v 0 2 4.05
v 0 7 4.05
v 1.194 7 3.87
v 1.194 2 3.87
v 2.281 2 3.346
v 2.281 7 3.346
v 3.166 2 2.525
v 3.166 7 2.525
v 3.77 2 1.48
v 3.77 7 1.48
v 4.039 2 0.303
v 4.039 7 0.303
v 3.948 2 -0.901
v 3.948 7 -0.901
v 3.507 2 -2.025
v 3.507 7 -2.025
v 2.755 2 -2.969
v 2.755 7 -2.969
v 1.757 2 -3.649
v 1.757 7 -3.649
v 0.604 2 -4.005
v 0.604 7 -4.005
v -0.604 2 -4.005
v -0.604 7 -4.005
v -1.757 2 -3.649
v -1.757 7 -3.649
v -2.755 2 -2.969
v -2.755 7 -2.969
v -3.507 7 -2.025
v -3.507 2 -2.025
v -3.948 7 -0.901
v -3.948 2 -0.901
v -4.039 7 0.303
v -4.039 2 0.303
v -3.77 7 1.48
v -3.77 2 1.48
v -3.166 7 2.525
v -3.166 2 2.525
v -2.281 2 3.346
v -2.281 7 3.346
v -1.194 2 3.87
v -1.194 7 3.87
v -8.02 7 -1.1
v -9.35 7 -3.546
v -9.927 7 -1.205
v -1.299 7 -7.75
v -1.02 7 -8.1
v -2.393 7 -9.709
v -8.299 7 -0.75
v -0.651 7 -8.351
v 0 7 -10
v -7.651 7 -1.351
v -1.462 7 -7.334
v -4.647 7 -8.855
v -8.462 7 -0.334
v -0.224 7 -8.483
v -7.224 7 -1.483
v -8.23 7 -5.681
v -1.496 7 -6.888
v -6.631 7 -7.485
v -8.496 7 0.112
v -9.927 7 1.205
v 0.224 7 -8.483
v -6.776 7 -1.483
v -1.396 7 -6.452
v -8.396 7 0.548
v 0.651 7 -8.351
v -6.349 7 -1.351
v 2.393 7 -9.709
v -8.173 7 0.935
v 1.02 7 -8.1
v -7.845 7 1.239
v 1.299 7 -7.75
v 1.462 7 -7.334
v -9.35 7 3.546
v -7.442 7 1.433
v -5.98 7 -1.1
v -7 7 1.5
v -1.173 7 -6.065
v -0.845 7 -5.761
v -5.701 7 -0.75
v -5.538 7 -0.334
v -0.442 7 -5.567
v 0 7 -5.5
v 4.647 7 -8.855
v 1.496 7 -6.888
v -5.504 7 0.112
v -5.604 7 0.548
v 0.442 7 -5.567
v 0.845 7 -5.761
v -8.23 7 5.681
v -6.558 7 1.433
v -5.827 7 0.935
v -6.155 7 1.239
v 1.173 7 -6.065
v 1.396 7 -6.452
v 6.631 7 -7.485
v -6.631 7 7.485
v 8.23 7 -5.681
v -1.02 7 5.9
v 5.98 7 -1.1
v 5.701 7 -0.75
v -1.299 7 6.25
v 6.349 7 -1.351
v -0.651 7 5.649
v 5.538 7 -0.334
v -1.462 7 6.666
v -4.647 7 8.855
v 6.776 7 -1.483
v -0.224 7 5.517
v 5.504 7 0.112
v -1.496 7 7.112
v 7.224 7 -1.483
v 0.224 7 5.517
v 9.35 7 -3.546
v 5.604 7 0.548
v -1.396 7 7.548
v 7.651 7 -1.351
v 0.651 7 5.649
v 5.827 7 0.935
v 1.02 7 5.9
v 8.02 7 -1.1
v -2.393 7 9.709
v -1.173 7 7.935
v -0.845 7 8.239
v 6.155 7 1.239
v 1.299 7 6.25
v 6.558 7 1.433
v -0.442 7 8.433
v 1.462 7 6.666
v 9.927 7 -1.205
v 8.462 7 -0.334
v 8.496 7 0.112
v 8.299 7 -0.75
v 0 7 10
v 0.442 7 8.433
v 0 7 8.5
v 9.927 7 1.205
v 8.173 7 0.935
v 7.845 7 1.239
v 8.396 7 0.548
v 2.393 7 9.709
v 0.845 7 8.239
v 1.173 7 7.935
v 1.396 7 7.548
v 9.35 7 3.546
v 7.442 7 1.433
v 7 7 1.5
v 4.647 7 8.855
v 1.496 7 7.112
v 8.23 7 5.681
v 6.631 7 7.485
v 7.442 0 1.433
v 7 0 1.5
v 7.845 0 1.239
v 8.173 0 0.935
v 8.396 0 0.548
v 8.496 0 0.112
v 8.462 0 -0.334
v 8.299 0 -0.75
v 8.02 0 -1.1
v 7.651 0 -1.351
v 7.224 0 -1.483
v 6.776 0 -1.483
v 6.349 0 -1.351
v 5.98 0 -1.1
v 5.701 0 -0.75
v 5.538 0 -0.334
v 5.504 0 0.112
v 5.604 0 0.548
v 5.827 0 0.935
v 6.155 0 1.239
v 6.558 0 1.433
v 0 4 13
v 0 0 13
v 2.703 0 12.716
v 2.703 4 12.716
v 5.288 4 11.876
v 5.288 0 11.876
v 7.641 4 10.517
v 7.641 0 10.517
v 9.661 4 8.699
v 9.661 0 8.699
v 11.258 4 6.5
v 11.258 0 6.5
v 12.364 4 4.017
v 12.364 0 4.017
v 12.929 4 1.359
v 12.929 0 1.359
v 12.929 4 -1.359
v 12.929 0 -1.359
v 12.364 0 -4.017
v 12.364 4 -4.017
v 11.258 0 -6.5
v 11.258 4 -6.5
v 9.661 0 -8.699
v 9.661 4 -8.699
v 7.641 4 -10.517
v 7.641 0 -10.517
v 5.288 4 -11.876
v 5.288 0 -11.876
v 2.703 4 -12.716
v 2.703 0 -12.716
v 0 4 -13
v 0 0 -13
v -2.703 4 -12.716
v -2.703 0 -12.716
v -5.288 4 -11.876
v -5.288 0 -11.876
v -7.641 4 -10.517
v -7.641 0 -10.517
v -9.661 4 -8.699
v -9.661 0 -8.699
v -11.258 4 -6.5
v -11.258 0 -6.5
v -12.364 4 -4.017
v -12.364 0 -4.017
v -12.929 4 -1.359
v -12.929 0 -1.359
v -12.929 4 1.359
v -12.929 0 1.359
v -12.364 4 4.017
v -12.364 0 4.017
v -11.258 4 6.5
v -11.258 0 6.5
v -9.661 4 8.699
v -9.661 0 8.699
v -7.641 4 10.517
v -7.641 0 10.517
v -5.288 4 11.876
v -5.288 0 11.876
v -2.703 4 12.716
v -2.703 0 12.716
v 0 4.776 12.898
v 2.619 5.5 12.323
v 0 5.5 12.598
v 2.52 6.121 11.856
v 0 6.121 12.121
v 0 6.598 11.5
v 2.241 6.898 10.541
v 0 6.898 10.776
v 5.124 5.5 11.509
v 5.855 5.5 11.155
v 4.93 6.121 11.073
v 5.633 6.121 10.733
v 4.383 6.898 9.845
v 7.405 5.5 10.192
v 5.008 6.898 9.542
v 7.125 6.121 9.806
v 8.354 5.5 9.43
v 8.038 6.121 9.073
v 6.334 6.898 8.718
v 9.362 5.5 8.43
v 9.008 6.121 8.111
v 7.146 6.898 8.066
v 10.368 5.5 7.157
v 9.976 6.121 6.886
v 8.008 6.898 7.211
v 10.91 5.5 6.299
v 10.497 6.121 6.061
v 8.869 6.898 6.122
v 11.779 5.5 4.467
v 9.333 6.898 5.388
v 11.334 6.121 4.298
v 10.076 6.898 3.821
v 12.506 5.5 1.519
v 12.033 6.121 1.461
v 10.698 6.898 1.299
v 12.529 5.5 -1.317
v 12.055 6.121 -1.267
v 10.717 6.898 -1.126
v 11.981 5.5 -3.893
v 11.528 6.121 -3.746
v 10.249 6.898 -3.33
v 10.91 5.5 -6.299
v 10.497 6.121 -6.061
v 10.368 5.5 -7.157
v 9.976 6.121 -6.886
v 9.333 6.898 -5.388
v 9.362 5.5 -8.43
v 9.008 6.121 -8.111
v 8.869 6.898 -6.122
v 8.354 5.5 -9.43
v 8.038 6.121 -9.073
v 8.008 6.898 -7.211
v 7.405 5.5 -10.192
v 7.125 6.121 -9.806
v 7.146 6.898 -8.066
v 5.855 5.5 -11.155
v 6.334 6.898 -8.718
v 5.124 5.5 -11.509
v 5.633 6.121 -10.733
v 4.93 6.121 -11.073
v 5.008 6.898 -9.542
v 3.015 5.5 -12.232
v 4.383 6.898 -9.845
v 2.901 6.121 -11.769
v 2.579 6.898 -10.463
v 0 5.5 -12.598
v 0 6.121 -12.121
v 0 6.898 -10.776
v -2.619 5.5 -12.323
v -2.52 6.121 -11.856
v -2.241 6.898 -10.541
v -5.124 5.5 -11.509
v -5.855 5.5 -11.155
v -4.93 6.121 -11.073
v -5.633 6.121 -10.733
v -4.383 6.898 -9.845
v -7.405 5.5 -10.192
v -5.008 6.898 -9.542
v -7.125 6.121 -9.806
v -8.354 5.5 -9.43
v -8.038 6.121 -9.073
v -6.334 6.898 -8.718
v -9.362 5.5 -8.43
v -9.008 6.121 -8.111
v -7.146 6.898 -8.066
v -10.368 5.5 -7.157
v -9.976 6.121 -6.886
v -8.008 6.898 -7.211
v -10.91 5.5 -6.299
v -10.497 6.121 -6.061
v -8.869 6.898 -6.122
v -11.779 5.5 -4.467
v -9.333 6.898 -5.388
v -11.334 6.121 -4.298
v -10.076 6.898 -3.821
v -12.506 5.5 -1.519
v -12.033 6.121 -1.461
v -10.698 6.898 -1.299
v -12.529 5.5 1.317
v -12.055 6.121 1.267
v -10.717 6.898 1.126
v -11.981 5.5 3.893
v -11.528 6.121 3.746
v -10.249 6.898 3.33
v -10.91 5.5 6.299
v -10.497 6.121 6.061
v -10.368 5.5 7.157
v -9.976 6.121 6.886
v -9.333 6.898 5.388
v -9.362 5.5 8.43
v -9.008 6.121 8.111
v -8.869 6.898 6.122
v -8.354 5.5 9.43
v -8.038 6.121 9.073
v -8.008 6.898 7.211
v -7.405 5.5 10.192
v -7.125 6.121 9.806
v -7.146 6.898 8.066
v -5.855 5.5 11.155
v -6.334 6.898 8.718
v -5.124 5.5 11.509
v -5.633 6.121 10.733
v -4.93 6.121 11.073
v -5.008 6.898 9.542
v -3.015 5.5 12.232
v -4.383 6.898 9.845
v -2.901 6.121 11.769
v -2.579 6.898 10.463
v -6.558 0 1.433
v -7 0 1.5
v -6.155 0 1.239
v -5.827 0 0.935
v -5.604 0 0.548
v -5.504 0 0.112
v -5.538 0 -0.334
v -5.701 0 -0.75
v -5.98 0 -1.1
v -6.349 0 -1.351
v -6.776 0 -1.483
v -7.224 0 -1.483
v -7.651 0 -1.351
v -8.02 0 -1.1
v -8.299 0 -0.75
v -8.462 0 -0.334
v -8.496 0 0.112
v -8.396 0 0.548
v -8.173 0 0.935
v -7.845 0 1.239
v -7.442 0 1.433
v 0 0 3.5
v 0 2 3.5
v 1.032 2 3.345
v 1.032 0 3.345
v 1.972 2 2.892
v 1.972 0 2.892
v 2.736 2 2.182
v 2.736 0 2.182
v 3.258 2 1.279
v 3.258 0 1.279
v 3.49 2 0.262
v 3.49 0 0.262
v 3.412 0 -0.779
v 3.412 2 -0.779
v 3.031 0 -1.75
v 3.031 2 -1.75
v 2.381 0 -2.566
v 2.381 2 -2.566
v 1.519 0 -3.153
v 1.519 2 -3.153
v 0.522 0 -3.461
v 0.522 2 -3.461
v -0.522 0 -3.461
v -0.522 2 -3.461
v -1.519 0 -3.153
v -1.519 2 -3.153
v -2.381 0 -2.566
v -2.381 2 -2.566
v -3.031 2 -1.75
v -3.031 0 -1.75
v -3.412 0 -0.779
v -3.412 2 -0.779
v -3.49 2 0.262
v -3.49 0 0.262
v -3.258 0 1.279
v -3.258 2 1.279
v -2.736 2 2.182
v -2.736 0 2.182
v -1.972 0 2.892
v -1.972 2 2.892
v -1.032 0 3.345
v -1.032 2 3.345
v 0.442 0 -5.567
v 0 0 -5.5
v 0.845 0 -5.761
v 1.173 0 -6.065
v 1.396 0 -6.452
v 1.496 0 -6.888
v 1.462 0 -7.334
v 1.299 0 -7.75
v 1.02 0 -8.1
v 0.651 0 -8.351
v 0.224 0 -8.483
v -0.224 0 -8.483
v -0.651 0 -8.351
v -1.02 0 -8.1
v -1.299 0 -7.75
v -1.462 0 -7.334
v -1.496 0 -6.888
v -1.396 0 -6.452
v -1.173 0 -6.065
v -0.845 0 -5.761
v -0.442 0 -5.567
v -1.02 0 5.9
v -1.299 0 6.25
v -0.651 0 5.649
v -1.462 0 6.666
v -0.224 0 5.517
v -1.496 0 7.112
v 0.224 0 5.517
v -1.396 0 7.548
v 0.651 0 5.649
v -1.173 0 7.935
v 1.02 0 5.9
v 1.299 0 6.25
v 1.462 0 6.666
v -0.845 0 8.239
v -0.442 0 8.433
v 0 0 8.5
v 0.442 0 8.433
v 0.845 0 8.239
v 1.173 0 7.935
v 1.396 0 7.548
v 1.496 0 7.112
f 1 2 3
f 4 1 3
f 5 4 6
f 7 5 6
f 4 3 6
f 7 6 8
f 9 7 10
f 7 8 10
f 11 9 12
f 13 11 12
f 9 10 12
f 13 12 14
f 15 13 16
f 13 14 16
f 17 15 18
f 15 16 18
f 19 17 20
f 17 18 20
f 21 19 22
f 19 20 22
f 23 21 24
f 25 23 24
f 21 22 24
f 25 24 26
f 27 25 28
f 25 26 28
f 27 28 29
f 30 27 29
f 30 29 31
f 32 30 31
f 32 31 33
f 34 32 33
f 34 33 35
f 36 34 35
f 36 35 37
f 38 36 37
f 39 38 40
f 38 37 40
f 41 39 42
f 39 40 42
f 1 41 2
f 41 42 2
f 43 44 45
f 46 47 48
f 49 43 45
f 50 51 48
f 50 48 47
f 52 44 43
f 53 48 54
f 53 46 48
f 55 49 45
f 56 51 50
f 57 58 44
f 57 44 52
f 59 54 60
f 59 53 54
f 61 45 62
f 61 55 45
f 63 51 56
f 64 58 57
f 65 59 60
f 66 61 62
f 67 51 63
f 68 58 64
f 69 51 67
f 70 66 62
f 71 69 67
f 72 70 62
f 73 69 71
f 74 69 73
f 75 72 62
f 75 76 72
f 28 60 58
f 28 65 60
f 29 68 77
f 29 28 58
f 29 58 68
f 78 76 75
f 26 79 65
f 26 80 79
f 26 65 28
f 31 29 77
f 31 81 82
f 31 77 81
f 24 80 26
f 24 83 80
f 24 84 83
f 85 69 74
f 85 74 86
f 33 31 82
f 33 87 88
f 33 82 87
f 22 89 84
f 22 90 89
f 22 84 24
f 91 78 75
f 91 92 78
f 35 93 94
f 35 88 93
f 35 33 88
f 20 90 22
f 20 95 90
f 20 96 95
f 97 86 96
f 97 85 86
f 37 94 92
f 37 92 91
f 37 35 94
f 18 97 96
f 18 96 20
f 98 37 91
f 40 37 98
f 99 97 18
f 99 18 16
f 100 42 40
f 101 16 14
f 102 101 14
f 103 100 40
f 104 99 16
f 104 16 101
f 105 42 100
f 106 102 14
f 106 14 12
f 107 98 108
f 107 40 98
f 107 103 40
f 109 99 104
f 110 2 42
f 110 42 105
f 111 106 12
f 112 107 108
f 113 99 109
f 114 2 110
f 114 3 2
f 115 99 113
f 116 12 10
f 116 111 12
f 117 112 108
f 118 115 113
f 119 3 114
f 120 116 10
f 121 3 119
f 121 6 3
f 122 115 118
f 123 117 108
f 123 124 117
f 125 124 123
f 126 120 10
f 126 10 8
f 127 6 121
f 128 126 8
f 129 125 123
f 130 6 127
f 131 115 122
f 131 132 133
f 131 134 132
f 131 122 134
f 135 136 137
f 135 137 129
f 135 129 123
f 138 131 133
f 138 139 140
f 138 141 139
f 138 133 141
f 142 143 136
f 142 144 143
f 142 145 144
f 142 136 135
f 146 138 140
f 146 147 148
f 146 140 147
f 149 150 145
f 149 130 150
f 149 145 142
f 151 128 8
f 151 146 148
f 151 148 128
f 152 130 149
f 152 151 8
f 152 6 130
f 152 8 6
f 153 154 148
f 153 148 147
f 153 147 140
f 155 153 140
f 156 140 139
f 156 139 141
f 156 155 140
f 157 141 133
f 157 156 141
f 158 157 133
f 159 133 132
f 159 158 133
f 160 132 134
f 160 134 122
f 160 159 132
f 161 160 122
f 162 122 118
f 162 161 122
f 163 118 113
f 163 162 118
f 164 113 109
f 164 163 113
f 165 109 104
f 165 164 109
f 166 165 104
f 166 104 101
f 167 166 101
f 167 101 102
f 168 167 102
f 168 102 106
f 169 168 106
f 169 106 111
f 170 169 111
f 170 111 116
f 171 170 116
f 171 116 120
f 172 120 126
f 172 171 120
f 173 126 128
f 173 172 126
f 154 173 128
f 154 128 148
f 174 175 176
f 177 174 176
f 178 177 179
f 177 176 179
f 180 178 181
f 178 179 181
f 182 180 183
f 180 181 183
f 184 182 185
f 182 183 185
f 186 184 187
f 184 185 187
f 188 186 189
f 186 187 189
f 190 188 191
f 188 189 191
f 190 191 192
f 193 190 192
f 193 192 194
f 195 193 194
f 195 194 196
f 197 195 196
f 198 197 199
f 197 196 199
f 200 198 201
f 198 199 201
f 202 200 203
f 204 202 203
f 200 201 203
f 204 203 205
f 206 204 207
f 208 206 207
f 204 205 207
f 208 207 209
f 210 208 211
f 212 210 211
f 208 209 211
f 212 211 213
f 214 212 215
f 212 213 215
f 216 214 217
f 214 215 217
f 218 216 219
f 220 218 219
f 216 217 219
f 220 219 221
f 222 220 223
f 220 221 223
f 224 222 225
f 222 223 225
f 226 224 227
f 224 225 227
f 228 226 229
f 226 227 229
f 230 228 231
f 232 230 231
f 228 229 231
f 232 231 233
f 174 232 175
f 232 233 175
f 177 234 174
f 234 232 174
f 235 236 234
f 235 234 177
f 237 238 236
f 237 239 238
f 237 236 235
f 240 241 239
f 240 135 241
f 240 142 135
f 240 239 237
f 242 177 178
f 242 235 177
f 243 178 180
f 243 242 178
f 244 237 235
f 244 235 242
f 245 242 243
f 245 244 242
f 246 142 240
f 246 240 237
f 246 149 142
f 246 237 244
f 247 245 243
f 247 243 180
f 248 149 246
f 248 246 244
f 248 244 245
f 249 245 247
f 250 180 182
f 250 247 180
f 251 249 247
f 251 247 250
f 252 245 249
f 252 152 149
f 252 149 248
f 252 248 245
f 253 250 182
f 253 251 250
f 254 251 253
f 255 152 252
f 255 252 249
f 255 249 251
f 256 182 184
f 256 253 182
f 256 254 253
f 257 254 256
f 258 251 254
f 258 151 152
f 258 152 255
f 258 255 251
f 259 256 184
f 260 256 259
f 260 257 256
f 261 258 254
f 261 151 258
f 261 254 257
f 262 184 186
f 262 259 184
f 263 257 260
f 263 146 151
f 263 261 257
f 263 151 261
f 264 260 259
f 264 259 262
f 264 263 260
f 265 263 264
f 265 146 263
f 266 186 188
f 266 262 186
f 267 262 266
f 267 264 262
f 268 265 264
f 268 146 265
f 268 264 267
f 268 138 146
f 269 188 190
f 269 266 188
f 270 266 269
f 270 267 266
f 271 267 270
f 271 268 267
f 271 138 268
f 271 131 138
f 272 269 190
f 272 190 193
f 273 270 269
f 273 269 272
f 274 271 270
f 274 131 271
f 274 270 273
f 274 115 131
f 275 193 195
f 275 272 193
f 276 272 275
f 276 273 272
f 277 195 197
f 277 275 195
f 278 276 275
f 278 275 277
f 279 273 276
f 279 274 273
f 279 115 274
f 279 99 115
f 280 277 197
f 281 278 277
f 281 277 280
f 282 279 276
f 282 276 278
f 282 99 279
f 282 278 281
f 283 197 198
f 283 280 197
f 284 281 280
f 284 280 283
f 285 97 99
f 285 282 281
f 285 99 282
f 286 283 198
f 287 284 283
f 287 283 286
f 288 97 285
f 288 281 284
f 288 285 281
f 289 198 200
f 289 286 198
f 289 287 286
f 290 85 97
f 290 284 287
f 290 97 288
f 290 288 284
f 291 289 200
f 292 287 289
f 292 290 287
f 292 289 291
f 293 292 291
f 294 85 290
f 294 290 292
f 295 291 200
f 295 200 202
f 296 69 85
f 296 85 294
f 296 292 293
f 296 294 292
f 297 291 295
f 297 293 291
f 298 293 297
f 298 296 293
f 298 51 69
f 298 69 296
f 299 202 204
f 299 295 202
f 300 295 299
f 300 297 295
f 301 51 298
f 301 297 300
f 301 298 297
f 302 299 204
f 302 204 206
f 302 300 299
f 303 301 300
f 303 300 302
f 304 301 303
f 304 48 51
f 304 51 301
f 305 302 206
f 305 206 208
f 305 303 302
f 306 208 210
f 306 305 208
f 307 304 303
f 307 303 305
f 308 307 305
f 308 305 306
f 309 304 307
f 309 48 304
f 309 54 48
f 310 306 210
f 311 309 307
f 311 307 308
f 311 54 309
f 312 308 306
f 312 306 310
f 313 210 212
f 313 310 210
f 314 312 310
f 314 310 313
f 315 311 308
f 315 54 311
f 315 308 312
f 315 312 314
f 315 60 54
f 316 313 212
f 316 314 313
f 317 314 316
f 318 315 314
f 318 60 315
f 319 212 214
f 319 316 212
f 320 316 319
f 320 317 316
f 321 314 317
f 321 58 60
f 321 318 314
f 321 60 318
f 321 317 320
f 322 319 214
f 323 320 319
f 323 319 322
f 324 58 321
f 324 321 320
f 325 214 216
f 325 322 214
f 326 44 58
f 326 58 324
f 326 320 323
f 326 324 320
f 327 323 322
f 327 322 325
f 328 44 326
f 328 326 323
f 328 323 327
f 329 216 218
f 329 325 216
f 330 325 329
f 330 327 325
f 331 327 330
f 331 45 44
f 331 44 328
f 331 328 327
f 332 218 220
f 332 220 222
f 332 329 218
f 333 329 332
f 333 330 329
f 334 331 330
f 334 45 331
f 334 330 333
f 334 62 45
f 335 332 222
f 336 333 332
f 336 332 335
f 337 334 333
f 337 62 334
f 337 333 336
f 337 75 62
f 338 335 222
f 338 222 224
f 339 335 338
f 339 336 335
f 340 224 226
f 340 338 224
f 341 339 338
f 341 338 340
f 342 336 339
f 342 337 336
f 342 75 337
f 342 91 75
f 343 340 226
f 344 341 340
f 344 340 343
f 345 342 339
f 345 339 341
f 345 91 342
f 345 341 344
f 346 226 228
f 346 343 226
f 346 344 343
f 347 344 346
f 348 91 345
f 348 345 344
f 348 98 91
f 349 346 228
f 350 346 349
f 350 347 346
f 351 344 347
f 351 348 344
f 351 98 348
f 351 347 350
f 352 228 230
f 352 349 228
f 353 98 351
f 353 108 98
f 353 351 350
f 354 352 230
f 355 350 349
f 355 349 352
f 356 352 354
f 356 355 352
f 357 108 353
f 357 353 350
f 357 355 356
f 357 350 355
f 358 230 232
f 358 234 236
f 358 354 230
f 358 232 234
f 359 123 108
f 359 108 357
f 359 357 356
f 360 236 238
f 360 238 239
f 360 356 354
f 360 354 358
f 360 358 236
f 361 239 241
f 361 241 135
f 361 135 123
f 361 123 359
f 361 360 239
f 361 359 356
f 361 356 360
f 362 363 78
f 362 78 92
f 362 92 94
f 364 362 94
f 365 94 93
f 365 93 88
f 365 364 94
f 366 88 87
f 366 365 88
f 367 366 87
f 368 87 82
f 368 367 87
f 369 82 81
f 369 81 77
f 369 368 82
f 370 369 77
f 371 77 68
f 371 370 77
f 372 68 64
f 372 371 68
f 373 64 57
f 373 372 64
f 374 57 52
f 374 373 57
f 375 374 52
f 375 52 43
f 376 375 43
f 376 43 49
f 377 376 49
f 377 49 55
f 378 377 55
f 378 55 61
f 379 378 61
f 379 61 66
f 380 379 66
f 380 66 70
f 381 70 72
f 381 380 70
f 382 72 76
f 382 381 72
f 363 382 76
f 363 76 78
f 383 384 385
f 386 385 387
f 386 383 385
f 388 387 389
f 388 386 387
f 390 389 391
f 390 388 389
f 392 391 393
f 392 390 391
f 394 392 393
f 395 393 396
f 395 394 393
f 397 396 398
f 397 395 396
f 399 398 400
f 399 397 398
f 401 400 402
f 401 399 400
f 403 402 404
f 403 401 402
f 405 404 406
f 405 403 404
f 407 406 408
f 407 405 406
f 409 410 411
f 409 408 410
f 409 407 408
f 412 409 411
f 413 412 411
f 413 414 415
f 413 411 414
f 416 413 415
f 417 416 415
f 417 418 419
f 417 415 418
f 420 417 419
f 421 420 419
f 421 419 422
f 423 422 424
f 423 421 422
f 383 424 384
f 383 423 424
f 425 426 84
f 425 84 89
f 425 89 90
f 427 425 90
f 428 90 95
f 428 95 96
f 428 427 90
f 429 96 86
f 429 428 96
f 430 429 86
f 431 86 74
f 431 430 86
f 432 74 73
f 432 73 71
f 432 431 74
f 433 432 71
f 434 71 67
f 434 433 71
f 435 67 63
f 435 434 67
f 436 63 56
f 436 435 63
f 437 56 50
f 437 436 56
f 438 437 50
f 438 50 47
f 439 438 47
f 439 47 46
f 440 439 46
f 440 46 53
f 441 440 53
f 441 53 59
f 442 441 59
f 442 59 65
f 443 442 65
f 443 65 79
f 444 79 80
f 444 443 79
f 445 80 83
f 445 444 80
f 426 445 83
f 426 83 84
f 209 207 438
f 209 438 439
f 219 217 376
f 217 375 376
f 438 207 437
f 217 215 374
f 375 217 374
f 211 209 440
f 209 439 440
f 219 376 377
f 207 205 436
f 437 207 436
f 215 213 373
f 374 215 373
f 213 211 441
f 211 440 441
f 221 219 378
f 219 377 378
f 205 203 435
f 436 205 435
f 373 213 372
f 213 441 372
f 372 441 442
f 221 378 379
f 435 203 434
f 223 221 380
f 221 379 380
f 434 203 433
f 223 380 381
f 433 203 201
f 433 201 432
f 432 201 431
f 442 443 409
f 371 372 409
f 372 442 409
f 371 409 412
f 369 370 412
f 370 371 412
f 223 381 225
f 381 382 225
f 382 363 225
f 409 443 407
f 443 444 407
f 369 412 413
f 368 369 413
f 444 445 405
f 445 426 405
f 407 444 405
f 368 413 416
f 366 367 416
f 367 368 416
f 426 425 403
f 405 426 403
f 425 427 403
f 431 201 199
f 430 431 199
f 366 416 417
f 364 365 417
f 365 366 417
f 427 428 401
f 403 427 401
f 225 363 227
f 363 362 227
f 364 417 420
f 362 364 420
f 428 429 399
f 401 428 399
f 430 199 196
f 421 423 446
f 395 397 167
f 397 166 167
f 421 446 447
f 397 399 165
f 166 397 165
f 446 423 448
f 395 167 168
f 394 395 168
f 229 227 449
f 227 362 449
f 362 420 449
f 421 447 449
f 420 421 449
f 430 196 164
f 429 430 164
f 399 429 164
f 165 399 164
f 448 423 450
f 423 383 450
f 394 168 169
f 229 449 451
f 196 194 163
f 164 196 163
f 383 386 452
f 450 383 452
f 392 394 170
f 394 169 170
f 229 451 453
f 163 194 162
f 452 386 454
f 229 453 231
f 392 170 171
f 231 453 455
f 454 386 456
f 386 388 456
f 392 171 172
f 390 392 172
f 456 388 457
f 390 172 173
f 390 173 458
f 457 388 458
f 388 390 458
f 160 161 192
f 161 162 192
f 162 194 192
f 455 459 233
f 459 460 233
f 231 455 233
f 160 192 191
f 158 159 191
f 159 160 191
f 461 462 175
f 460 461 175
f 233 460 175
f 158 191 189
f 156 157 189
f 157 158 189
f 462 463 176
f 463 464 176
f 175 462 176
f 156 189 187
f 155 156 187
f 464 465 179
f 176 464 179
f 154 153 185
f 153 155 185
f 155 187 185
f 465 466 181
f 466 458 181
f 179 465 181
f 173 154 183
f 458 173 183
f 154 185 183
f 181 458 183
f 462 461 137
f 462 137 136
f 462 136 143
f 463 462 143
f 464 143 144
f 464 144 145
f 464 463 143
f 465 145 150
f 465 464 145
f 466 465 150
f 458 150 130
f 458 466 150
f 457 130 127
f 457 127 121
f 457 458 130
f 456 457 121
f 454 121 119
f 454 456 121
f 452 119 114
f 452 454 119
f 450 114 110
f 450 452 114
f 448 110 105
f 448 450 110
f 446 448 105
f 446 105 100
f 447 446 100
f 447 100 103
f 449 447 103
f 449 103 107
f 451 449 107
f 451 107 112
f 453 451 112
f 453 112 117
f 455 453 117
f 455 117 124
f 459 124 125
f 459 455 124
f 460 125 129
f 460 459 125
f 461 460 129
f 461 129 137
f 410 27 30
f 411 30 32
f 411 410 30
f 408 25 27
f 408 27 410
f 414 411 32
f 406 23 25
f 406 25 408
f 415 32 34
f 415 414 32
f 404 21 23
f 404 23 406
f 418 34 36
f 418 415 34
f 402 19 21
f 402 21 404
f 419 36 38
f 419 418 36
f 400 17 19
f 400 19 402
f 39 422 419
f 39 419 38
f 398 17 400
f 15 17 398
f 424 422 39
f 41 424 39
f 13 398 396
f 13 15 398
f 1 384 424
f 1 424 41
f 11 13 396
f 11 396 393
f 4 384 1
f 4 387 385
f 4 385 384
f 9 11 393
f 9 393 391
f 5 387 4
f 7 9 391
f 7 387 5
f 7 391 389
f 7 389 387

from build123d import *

# Parameters (mm, degrees)
SKETCH1_R           = 13
SKETCH1_R_2         = 3.5
SKETCH1_R_3         = 1.5
BOSS_EXTRUDE1_DEPTH = 7
SKETCH2_R           = 4.05
CUT_EXTRUDE1_DEPTH  = 5
FILLET1_R           = 3


with BuildPart() as part:
    # Sketch1 → Boss-Extrude1 (new body)
    with BuildSketch(Plane(origin=(0, 0, 0), x_dir=(1, 0, 0), z_dir=(0, 1, 0))):
        with Locations(Location((0, 0, 0), (0, 0, 270))):
            Circle(SKETCH1_R)
        with Locations(Location((0, 0, 0), (0, 0, 270))):
            Circle(SKETCH1_R_2, mode=Mode.SUBTRACT)
        with Locations(Location((0, 7, 0), (0, 0, 270))):
            Circle(SKETCH1_R_3, mode=Mode.SUBTRACT)
        with Locations(Location((7, 0, 0), (0, 0, 270))):
            Circle(SKETCH1_R_3, mode=Mode.SUBTRACT)
        with Locations(Location((0, -7, 0), (0, 0, 270))):
            Circle(SKETCH1_R_3, mode=Mode.SUBTRACT)
        with Locations(Location((-7, 0, 0), (0, 0, 270))):
            Circle(SKETCH1_R_3, mode=Mode.SUBTRACT)
    extrude(amount=BOSS_EXTRUDE1_DEPTH)

    # Sketch2 → Cut-Extrude1 (cut)
    with BuildSketch(Plane(origin=(0, 7, 0), x_dir=(1, 0, 0), z_dir=(0, 1, 0))):
        with Locations(Location((0, 0, 0), (0, 0, 270))):
            Circle(SKETCH2_R)
    extrude(amount=-CUT_EXTRUDE1_DEPTH, mode=Mode.SUBTRACT)

    # Fillet1
    fillet1_edges = [part.edges().sort_by_distance(p)[0] for p in [
        (0, 7, -13),
    ]]
    fillet(fillet1_edges, radius=FILLET1_R)


solid = part.part
